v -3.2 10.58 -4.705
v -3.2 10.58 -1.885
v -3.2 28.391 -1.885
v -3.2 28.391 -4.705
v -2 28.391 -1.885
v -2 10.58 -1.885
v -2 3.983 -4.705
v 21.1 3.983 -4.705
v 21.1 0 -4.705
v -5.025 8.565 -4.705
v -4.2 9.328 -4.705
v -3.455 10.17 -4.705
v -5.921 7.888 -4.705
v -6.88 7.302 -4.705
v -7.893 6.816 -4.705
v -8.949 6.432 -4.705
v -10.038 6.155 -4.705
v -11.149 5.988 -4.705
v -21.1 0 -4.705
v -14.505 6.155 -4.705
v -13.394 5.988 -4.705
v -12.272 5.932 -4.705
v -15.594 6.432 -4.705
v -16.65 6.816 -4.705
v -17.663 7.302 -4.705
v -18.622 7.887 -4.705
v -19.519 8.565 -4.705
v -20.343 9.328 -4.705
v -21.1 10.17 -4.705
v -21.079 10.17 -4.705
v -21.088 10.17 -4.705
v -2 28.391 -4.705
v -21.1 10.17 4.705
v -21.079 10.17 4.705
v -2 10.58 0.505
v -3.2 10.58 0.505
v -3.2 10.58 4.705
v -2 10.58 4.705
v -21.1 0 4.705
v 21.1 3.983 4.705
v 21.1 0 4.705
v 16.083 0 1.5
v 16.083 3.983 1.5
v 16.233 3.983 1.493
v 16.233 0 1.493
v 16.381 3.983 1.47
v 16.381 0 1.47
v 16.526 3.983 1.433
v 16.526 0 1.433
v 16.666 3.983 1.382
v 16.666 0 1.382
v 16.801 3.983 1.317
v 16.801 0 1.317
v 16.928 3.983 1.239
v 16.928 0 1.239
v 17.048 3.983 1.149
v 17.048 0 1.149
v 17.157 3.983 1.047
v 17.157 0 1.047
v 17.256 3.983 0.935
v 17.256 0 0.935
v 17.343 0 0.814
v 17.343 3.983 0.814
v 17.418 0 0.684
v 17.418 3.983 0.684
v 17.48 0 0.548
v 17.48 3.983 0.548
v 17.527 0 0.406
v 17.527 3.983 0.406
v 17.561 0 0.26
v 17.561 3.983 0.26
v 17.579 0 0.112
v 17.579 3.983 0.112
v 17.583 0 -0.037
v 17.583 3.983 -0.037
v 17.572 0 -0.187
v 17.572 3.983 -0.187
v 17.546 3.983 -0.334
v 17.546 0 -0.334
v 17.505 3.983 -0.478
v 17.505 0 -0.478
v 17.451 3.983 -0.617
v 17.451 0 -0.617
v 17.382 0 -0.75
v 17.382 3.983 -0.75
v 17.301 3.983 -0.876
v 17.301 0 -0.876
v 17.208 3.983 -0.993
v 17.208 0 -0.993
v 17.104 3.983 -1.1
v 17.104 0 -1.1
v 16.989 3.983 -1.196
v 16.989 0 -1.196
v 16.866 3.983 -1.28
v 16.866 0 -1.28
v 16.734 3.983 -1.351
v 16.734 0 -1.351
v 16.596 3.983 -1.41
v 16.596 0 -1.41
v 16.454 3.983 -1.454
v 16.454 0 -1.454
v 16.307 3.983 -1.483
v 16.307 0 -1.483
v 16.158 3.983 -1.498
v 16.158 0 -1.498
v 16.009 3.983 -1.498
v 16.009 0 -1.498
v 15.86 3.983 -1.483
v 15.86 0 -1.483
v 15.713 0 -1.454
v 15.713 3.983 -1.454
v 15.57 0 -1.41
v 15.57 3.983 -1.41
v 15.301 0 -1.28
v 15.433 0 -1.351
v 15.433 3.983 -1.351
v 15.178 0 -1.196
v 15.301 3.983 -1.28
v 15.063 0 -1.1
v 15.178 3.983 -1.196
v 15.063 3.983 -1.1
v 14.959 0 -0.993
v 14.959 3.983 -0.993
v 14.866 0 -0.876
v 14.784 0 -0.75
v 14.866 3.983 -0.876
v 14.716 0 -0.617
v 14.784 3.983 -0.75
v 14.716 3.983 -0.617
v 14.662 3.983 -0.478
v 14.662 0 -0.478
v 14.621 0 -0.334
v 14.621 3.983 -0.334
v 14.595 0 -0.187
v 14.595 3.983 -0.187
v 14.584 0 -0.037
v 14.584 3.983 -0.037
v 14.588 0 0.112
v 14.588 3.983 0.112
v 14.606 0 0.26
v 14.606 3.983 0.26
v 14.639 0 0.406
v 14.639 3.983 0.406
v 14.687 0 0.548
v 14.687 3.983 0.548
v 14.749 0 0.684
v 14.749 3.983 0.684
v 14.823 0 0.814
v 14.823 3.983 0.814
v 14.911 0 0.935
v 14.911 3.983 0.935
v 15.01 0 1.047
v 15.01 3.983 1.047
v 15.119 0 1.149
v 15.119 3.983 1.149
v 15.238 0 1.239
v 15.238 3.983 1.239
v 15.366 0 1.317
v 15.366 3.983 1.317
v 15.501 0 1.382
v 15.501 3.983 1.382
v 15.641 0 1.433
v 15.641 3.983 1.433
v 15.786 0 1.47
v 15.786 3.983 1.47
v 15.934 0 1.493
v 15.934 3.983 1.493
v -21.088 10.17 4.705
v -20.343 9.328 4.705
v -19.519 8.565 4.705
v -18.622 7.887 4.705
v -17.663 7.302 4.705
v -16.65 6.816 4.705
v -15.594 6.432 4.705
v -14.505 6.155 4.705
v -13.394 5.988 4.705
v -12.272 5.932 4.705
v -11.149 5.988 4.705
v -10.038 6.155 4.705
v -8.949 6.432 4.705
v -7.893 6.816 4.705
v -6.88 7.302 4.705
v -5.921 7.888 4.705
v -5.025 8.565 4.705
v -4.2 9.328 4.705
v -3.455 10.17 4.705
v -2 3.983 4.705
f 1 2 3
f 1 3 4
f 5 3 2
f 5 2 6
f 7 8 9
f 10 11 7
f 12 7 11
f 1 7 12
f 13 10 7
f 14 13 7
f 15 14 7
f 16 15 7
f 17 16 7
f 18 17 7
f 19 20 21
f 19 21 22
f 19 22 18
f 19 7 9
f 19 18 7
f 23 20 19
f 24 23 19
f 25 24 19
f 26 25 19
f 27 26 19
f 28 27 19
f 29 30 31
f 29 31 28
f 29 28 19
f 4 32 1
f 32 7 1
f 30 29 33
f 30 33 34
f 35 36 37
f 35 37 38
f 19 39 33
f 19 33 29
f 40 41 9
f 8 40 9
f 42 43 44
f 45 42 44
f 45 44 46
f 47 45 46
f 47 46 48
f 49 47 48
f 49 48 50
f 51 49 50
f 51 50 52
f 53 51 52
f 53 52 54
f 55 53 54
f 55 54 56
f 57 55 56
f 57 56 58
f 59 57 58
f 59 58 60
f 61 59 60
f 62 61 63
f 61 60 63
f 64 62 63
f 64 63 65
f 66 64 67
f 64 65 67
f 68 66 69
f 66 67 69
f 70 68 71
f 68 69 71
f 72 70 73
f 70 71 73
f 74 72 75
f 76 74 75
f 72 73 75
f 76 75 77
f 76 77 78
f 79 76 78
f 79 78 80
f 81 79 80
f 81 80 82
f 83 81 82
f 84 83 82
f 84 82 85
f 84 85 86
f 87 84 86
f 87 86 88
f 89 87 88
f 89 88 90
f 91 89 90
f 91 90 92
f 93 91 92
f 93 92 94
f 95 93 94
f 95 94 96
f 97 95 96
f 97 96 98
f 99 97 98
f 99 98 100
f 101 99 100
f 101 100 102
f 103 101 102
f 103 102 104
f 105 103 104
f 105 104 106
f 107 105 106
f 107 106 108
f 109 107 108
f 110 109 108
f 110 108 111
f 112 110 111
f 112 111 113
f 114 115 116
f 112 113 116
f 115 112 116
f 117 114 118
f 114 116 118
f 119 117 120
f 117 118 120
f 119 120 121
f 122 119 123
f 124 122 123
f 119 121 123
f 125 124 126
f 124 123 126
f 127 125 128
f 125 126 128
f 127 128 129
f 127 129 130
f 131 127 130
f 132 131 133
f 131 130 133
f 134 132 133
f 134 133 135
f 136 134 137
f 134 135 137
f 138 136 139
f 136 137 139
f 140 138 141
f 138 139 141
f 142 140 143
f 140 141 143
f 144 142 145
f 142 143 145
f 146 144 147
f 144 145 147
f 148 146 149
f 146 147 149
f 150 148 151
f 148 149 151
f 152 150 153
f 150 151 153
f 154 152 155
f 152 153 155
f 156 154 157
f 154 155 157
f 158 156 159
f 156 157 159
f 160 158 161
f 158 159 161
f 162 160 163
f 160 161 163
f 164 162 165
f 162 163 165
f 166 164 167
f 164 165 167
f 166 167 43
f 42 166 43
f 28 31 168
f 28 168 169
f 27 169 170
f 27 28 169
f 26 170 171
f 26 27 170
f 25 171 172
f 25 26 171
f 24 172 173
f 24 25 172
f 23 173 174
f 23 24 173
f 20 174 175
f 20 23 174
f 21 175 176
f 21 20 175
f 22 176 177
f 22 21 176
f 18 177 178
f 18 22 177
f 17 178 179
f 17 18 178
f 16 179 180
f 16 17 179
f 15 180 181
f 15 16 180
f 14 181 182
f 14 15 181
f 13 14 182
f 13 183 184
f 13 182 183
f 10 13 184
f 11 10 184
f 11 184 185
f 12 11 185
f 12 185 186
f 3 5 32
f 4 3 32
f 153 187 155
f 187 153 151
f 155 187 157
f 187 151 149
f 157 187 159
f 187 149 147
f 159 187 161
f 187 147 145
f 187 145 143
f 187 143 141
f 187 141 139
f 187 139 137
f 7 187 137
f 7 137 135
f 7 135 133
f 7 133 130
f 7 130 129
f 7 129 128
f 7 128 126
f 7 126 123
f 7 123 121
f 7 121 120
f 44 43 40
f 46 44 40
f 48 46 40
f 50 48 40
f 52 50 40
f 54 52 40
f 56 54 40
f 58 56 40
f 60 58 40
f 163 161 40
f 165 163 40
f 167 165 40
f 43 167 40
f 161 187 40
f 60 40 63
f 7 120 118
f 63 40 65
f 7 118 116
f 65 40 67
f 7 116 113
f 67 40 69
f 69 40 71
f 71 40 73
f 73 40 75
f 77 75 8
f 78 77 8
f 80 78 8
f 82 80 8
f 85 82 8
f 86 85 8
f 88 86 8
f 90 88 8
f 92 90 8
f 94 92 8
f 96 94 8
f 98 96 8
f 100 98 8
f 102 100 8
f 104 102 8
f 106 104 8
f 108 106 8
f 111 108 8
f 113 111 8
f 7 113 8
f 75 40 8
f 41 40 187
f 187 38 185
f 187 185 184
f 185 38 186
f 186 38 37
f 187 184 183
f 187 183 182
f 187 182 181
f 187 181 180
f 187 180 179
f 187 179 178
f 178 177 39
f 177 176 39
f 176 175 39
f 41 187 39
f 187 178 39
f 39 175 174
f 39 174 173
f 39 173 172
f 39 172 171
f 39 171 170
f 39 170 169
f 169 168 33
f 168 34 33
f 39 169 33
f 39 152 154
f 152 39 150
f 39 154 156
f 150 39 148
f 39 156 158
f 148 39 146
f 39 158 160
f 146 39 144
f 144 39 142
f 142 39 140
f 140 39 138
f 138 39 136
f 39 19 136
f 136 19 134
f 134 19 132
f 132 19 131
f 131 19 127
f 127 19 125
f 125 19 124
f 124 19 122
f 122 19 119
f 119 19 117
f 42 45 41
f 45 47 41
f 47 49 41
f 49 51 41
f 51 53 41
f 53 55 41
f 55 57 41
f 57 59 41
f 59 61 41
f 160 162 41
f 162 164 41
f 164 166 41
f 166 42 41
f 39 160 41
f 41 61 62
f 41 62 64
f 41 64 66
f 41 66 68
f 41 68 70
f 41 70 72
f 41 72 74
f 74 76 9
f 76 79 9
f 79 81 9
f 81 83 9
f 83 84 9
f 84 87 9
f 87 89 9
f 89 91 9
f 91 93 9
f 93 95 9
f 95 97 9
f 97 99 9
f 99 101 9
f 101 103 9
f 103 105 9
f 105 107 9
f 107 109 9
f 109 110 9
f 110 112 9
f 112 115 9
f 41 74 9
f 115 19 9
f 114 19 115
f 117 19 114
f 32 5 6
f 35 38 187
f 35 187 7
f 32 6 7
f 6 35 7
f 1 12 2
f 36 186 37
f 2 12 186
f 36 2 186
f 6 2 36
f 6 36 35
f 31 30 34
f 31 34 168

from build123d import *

# Parameters (mm, degrees)
SKETCH1_W           = 42.2
SKETCH1_H           = 9.41
BOSS_EXTRUDE1_DEPTH = 5.95
SKETCH2_W           = 23.1
SKETCH2_H           = 0.95
CUT_EXTRUDE1_DEPTH  = 10
SKETCH3_W           = 19.1
SKETCH3_H           = 9.41
BOSS_EXTRUDE2_DEPTH = 24.37
CUT_EXTRUDE8_DEPTH  = 20
SKETCH6_W           = 17.9
SKETCH6_H           = 9.41
CUT_EXTRUDE9_DEPTH  = 20.15
BOSS_EXTRUDE4_DEPTH = 9.41
SKETCH9_W           = 1.2
SKETCH9_H           = 4.2
CUT_EXTRUDE10_DEPTH = 19.74
SKETCH10_W          = 5.21
SKETCH10_H          = 1.92911269
CUT_EXTRUDE11_DEPTH = 19.74
SKETCH11_W          = 1.2
SKETCH11_H          = 2.39
CUT_EXTRUDE13_DEPTH = 17.810638
SKETCH12_W          = 9.41
SKETCH12_H          = 1.01654614
CUT_EXTRUDE14_DEPTH = 23.1
SKETCH13_R          = 1.5
CUT_EXTRUDE15_DEPTH = 23.1


with BuildPart() as part:
    # Sketch1 → Boss-Extrude1 (new body)
    with BuildSketch(Plane(origin=(0, 0, 0), x_dir=(1, 0, 0), z_dir=(0, 1, 0))):
        Rectangle(SKETCH1_W, SKETCH1_H)
    extrude(amount=BOSS_EXTRUDE1_DEPTH)

    # Sketch2 → Cut-Extrude1 (cut)
    with BuildSketch(Plane.XY.offset(4.705)):
        with Locations((9.55, 5.475)):
            Rectangle(SKETCH2_W, SKETCH2_H)
    extrude(amount=-CUT_EXTRUDE1_DEPTH, mode=Mode.SUBTRACT)

    # Sketch3 → Boss-Extrude2 (add)
    with BuildSketch(Plane(origin=(0, 5.95, 0), x_dir=(1, 0, 0), z_dir=(0, 1, 0))):
        with Locations((-11.55, 0)):
            Rectangle(SKETCH3_W, SKETCH3_H)
    extrude(amount=BOSS_EXTRUDE2_DEPTH)

    # Sketch5 → Cut-Extrude8 (cut)
    with BuildSketch(Plane(origin=(0, 0, -4.705), x_dir=(-1, 0, 0), z_dir=(0, 0, -1))):
        with BuildLine():
            Line((3.2, 10.501800084), (21.087895638, 10.16983908))
            ThreePointArc((21.087895638, 10.16983908), (12.062256205, 5.933823433), (3.2, 10.501800084))
        make_face()
    extrude(amount=-CUT_EXTRUDE8_DEPTH, mode=Mode.SUBTRACT)

    # Sketch6 → Cut-Extrude9 (cut)
    with BuildSketch(Plane(origin=(0, 30.32, 0), x_dir=(1, 0, 0), z_dir=(0, 1, 0))):
        with Locations((-12.15, 0)):
            Rectangle(SKETCH6_W, SKETCH6_H)
    extrude(amount=-CUT_EXTRUDE9_DEPTH, mode=Mode.SUBTRACT)

    # Sketch8 → Boss-Extrude4 (add)
    with BuildSketch(Plane.XY.offset(4.705)):
        Polygon((-3.455417816, 10.17), (-3.2, 10.580249423), (-3.2, 10.17), align=None)
    extrude(amount=-BOSS_EXTRUDE4_DEPTH)

    # Sketch9 → Cut-Extrude10 (cut)
    with BuildSketch(Plane(origin=(0, 30.32, 0), x_dir=(1, 0, 0), z_dir=(0, 1, 0))):
        with Locations((-2.6, -2.605)):
            Rectangle(SKETCH9_W, SKETCH9_H)
    extrude(amount=-CUT_EXTRUDE10_DEPTH, mode=Mode.SUBTRACT)

    # Sketch10 → Cut-Extrude11 (cut)
    with BuildSketch(Plane(origin=(-2, 0, 0), x_dir=(0, 0, -1), z_dir=(1, 0, 0))):
        with Locations((2.1, 29.355443655)):
            Rectangle(SKETCH10_W, SKETCH10_H)
    extrude(amount=-CUT_EXTRUDE11_DEPTH, mode=Mode.SUBTRACT)

    # Sketch11 → Cut-Extrude13 (cut)
    with BuildSketch(Plane(origin=(0, 28.39088731, 0), x_dir=(1, 0, 0), z_dir=(0, 1, 0))):
        with Locations((-2.6, 0.69)):
            Rectangle(SKETCH11_W, SKETCH11_H)
    extrude(amount=-CUT_EXTRUDE13_DEPTH, mode=Mode.SUBTRACT)

    # Sketch12 → Cut-Extrude14 (cut)
    with BuildSketch(Plane(origin=(21.1, 0, 0), x_dir=(0, 0, -1), z_dir=(1, 0, 0))):
        with Locations((0, 4.49172693)):
            Rectangle(SKETCH12_W, SKETCH12_H)
    extrude(amount=-CUT_EXTRUDE14_DEPTH, mode=Mode.SUBTRACT)

    # Sketch13 → Cut-Extrude15 (cut)
    with BuildSketch(Plane(origin=(0, 3.98345386, 0), x_dir=(1, 0, 0), z_dir=(0, 1, 0))):
        with Locations(Location((16.083417544, 0, 0), (0, 0, 270))):
            Circle(SKETCH13_R)
    extrude(amount=-CUT_EXTRUDE15_DEPTH, mode=Mode.SUBTRACT)


solid = part.part
